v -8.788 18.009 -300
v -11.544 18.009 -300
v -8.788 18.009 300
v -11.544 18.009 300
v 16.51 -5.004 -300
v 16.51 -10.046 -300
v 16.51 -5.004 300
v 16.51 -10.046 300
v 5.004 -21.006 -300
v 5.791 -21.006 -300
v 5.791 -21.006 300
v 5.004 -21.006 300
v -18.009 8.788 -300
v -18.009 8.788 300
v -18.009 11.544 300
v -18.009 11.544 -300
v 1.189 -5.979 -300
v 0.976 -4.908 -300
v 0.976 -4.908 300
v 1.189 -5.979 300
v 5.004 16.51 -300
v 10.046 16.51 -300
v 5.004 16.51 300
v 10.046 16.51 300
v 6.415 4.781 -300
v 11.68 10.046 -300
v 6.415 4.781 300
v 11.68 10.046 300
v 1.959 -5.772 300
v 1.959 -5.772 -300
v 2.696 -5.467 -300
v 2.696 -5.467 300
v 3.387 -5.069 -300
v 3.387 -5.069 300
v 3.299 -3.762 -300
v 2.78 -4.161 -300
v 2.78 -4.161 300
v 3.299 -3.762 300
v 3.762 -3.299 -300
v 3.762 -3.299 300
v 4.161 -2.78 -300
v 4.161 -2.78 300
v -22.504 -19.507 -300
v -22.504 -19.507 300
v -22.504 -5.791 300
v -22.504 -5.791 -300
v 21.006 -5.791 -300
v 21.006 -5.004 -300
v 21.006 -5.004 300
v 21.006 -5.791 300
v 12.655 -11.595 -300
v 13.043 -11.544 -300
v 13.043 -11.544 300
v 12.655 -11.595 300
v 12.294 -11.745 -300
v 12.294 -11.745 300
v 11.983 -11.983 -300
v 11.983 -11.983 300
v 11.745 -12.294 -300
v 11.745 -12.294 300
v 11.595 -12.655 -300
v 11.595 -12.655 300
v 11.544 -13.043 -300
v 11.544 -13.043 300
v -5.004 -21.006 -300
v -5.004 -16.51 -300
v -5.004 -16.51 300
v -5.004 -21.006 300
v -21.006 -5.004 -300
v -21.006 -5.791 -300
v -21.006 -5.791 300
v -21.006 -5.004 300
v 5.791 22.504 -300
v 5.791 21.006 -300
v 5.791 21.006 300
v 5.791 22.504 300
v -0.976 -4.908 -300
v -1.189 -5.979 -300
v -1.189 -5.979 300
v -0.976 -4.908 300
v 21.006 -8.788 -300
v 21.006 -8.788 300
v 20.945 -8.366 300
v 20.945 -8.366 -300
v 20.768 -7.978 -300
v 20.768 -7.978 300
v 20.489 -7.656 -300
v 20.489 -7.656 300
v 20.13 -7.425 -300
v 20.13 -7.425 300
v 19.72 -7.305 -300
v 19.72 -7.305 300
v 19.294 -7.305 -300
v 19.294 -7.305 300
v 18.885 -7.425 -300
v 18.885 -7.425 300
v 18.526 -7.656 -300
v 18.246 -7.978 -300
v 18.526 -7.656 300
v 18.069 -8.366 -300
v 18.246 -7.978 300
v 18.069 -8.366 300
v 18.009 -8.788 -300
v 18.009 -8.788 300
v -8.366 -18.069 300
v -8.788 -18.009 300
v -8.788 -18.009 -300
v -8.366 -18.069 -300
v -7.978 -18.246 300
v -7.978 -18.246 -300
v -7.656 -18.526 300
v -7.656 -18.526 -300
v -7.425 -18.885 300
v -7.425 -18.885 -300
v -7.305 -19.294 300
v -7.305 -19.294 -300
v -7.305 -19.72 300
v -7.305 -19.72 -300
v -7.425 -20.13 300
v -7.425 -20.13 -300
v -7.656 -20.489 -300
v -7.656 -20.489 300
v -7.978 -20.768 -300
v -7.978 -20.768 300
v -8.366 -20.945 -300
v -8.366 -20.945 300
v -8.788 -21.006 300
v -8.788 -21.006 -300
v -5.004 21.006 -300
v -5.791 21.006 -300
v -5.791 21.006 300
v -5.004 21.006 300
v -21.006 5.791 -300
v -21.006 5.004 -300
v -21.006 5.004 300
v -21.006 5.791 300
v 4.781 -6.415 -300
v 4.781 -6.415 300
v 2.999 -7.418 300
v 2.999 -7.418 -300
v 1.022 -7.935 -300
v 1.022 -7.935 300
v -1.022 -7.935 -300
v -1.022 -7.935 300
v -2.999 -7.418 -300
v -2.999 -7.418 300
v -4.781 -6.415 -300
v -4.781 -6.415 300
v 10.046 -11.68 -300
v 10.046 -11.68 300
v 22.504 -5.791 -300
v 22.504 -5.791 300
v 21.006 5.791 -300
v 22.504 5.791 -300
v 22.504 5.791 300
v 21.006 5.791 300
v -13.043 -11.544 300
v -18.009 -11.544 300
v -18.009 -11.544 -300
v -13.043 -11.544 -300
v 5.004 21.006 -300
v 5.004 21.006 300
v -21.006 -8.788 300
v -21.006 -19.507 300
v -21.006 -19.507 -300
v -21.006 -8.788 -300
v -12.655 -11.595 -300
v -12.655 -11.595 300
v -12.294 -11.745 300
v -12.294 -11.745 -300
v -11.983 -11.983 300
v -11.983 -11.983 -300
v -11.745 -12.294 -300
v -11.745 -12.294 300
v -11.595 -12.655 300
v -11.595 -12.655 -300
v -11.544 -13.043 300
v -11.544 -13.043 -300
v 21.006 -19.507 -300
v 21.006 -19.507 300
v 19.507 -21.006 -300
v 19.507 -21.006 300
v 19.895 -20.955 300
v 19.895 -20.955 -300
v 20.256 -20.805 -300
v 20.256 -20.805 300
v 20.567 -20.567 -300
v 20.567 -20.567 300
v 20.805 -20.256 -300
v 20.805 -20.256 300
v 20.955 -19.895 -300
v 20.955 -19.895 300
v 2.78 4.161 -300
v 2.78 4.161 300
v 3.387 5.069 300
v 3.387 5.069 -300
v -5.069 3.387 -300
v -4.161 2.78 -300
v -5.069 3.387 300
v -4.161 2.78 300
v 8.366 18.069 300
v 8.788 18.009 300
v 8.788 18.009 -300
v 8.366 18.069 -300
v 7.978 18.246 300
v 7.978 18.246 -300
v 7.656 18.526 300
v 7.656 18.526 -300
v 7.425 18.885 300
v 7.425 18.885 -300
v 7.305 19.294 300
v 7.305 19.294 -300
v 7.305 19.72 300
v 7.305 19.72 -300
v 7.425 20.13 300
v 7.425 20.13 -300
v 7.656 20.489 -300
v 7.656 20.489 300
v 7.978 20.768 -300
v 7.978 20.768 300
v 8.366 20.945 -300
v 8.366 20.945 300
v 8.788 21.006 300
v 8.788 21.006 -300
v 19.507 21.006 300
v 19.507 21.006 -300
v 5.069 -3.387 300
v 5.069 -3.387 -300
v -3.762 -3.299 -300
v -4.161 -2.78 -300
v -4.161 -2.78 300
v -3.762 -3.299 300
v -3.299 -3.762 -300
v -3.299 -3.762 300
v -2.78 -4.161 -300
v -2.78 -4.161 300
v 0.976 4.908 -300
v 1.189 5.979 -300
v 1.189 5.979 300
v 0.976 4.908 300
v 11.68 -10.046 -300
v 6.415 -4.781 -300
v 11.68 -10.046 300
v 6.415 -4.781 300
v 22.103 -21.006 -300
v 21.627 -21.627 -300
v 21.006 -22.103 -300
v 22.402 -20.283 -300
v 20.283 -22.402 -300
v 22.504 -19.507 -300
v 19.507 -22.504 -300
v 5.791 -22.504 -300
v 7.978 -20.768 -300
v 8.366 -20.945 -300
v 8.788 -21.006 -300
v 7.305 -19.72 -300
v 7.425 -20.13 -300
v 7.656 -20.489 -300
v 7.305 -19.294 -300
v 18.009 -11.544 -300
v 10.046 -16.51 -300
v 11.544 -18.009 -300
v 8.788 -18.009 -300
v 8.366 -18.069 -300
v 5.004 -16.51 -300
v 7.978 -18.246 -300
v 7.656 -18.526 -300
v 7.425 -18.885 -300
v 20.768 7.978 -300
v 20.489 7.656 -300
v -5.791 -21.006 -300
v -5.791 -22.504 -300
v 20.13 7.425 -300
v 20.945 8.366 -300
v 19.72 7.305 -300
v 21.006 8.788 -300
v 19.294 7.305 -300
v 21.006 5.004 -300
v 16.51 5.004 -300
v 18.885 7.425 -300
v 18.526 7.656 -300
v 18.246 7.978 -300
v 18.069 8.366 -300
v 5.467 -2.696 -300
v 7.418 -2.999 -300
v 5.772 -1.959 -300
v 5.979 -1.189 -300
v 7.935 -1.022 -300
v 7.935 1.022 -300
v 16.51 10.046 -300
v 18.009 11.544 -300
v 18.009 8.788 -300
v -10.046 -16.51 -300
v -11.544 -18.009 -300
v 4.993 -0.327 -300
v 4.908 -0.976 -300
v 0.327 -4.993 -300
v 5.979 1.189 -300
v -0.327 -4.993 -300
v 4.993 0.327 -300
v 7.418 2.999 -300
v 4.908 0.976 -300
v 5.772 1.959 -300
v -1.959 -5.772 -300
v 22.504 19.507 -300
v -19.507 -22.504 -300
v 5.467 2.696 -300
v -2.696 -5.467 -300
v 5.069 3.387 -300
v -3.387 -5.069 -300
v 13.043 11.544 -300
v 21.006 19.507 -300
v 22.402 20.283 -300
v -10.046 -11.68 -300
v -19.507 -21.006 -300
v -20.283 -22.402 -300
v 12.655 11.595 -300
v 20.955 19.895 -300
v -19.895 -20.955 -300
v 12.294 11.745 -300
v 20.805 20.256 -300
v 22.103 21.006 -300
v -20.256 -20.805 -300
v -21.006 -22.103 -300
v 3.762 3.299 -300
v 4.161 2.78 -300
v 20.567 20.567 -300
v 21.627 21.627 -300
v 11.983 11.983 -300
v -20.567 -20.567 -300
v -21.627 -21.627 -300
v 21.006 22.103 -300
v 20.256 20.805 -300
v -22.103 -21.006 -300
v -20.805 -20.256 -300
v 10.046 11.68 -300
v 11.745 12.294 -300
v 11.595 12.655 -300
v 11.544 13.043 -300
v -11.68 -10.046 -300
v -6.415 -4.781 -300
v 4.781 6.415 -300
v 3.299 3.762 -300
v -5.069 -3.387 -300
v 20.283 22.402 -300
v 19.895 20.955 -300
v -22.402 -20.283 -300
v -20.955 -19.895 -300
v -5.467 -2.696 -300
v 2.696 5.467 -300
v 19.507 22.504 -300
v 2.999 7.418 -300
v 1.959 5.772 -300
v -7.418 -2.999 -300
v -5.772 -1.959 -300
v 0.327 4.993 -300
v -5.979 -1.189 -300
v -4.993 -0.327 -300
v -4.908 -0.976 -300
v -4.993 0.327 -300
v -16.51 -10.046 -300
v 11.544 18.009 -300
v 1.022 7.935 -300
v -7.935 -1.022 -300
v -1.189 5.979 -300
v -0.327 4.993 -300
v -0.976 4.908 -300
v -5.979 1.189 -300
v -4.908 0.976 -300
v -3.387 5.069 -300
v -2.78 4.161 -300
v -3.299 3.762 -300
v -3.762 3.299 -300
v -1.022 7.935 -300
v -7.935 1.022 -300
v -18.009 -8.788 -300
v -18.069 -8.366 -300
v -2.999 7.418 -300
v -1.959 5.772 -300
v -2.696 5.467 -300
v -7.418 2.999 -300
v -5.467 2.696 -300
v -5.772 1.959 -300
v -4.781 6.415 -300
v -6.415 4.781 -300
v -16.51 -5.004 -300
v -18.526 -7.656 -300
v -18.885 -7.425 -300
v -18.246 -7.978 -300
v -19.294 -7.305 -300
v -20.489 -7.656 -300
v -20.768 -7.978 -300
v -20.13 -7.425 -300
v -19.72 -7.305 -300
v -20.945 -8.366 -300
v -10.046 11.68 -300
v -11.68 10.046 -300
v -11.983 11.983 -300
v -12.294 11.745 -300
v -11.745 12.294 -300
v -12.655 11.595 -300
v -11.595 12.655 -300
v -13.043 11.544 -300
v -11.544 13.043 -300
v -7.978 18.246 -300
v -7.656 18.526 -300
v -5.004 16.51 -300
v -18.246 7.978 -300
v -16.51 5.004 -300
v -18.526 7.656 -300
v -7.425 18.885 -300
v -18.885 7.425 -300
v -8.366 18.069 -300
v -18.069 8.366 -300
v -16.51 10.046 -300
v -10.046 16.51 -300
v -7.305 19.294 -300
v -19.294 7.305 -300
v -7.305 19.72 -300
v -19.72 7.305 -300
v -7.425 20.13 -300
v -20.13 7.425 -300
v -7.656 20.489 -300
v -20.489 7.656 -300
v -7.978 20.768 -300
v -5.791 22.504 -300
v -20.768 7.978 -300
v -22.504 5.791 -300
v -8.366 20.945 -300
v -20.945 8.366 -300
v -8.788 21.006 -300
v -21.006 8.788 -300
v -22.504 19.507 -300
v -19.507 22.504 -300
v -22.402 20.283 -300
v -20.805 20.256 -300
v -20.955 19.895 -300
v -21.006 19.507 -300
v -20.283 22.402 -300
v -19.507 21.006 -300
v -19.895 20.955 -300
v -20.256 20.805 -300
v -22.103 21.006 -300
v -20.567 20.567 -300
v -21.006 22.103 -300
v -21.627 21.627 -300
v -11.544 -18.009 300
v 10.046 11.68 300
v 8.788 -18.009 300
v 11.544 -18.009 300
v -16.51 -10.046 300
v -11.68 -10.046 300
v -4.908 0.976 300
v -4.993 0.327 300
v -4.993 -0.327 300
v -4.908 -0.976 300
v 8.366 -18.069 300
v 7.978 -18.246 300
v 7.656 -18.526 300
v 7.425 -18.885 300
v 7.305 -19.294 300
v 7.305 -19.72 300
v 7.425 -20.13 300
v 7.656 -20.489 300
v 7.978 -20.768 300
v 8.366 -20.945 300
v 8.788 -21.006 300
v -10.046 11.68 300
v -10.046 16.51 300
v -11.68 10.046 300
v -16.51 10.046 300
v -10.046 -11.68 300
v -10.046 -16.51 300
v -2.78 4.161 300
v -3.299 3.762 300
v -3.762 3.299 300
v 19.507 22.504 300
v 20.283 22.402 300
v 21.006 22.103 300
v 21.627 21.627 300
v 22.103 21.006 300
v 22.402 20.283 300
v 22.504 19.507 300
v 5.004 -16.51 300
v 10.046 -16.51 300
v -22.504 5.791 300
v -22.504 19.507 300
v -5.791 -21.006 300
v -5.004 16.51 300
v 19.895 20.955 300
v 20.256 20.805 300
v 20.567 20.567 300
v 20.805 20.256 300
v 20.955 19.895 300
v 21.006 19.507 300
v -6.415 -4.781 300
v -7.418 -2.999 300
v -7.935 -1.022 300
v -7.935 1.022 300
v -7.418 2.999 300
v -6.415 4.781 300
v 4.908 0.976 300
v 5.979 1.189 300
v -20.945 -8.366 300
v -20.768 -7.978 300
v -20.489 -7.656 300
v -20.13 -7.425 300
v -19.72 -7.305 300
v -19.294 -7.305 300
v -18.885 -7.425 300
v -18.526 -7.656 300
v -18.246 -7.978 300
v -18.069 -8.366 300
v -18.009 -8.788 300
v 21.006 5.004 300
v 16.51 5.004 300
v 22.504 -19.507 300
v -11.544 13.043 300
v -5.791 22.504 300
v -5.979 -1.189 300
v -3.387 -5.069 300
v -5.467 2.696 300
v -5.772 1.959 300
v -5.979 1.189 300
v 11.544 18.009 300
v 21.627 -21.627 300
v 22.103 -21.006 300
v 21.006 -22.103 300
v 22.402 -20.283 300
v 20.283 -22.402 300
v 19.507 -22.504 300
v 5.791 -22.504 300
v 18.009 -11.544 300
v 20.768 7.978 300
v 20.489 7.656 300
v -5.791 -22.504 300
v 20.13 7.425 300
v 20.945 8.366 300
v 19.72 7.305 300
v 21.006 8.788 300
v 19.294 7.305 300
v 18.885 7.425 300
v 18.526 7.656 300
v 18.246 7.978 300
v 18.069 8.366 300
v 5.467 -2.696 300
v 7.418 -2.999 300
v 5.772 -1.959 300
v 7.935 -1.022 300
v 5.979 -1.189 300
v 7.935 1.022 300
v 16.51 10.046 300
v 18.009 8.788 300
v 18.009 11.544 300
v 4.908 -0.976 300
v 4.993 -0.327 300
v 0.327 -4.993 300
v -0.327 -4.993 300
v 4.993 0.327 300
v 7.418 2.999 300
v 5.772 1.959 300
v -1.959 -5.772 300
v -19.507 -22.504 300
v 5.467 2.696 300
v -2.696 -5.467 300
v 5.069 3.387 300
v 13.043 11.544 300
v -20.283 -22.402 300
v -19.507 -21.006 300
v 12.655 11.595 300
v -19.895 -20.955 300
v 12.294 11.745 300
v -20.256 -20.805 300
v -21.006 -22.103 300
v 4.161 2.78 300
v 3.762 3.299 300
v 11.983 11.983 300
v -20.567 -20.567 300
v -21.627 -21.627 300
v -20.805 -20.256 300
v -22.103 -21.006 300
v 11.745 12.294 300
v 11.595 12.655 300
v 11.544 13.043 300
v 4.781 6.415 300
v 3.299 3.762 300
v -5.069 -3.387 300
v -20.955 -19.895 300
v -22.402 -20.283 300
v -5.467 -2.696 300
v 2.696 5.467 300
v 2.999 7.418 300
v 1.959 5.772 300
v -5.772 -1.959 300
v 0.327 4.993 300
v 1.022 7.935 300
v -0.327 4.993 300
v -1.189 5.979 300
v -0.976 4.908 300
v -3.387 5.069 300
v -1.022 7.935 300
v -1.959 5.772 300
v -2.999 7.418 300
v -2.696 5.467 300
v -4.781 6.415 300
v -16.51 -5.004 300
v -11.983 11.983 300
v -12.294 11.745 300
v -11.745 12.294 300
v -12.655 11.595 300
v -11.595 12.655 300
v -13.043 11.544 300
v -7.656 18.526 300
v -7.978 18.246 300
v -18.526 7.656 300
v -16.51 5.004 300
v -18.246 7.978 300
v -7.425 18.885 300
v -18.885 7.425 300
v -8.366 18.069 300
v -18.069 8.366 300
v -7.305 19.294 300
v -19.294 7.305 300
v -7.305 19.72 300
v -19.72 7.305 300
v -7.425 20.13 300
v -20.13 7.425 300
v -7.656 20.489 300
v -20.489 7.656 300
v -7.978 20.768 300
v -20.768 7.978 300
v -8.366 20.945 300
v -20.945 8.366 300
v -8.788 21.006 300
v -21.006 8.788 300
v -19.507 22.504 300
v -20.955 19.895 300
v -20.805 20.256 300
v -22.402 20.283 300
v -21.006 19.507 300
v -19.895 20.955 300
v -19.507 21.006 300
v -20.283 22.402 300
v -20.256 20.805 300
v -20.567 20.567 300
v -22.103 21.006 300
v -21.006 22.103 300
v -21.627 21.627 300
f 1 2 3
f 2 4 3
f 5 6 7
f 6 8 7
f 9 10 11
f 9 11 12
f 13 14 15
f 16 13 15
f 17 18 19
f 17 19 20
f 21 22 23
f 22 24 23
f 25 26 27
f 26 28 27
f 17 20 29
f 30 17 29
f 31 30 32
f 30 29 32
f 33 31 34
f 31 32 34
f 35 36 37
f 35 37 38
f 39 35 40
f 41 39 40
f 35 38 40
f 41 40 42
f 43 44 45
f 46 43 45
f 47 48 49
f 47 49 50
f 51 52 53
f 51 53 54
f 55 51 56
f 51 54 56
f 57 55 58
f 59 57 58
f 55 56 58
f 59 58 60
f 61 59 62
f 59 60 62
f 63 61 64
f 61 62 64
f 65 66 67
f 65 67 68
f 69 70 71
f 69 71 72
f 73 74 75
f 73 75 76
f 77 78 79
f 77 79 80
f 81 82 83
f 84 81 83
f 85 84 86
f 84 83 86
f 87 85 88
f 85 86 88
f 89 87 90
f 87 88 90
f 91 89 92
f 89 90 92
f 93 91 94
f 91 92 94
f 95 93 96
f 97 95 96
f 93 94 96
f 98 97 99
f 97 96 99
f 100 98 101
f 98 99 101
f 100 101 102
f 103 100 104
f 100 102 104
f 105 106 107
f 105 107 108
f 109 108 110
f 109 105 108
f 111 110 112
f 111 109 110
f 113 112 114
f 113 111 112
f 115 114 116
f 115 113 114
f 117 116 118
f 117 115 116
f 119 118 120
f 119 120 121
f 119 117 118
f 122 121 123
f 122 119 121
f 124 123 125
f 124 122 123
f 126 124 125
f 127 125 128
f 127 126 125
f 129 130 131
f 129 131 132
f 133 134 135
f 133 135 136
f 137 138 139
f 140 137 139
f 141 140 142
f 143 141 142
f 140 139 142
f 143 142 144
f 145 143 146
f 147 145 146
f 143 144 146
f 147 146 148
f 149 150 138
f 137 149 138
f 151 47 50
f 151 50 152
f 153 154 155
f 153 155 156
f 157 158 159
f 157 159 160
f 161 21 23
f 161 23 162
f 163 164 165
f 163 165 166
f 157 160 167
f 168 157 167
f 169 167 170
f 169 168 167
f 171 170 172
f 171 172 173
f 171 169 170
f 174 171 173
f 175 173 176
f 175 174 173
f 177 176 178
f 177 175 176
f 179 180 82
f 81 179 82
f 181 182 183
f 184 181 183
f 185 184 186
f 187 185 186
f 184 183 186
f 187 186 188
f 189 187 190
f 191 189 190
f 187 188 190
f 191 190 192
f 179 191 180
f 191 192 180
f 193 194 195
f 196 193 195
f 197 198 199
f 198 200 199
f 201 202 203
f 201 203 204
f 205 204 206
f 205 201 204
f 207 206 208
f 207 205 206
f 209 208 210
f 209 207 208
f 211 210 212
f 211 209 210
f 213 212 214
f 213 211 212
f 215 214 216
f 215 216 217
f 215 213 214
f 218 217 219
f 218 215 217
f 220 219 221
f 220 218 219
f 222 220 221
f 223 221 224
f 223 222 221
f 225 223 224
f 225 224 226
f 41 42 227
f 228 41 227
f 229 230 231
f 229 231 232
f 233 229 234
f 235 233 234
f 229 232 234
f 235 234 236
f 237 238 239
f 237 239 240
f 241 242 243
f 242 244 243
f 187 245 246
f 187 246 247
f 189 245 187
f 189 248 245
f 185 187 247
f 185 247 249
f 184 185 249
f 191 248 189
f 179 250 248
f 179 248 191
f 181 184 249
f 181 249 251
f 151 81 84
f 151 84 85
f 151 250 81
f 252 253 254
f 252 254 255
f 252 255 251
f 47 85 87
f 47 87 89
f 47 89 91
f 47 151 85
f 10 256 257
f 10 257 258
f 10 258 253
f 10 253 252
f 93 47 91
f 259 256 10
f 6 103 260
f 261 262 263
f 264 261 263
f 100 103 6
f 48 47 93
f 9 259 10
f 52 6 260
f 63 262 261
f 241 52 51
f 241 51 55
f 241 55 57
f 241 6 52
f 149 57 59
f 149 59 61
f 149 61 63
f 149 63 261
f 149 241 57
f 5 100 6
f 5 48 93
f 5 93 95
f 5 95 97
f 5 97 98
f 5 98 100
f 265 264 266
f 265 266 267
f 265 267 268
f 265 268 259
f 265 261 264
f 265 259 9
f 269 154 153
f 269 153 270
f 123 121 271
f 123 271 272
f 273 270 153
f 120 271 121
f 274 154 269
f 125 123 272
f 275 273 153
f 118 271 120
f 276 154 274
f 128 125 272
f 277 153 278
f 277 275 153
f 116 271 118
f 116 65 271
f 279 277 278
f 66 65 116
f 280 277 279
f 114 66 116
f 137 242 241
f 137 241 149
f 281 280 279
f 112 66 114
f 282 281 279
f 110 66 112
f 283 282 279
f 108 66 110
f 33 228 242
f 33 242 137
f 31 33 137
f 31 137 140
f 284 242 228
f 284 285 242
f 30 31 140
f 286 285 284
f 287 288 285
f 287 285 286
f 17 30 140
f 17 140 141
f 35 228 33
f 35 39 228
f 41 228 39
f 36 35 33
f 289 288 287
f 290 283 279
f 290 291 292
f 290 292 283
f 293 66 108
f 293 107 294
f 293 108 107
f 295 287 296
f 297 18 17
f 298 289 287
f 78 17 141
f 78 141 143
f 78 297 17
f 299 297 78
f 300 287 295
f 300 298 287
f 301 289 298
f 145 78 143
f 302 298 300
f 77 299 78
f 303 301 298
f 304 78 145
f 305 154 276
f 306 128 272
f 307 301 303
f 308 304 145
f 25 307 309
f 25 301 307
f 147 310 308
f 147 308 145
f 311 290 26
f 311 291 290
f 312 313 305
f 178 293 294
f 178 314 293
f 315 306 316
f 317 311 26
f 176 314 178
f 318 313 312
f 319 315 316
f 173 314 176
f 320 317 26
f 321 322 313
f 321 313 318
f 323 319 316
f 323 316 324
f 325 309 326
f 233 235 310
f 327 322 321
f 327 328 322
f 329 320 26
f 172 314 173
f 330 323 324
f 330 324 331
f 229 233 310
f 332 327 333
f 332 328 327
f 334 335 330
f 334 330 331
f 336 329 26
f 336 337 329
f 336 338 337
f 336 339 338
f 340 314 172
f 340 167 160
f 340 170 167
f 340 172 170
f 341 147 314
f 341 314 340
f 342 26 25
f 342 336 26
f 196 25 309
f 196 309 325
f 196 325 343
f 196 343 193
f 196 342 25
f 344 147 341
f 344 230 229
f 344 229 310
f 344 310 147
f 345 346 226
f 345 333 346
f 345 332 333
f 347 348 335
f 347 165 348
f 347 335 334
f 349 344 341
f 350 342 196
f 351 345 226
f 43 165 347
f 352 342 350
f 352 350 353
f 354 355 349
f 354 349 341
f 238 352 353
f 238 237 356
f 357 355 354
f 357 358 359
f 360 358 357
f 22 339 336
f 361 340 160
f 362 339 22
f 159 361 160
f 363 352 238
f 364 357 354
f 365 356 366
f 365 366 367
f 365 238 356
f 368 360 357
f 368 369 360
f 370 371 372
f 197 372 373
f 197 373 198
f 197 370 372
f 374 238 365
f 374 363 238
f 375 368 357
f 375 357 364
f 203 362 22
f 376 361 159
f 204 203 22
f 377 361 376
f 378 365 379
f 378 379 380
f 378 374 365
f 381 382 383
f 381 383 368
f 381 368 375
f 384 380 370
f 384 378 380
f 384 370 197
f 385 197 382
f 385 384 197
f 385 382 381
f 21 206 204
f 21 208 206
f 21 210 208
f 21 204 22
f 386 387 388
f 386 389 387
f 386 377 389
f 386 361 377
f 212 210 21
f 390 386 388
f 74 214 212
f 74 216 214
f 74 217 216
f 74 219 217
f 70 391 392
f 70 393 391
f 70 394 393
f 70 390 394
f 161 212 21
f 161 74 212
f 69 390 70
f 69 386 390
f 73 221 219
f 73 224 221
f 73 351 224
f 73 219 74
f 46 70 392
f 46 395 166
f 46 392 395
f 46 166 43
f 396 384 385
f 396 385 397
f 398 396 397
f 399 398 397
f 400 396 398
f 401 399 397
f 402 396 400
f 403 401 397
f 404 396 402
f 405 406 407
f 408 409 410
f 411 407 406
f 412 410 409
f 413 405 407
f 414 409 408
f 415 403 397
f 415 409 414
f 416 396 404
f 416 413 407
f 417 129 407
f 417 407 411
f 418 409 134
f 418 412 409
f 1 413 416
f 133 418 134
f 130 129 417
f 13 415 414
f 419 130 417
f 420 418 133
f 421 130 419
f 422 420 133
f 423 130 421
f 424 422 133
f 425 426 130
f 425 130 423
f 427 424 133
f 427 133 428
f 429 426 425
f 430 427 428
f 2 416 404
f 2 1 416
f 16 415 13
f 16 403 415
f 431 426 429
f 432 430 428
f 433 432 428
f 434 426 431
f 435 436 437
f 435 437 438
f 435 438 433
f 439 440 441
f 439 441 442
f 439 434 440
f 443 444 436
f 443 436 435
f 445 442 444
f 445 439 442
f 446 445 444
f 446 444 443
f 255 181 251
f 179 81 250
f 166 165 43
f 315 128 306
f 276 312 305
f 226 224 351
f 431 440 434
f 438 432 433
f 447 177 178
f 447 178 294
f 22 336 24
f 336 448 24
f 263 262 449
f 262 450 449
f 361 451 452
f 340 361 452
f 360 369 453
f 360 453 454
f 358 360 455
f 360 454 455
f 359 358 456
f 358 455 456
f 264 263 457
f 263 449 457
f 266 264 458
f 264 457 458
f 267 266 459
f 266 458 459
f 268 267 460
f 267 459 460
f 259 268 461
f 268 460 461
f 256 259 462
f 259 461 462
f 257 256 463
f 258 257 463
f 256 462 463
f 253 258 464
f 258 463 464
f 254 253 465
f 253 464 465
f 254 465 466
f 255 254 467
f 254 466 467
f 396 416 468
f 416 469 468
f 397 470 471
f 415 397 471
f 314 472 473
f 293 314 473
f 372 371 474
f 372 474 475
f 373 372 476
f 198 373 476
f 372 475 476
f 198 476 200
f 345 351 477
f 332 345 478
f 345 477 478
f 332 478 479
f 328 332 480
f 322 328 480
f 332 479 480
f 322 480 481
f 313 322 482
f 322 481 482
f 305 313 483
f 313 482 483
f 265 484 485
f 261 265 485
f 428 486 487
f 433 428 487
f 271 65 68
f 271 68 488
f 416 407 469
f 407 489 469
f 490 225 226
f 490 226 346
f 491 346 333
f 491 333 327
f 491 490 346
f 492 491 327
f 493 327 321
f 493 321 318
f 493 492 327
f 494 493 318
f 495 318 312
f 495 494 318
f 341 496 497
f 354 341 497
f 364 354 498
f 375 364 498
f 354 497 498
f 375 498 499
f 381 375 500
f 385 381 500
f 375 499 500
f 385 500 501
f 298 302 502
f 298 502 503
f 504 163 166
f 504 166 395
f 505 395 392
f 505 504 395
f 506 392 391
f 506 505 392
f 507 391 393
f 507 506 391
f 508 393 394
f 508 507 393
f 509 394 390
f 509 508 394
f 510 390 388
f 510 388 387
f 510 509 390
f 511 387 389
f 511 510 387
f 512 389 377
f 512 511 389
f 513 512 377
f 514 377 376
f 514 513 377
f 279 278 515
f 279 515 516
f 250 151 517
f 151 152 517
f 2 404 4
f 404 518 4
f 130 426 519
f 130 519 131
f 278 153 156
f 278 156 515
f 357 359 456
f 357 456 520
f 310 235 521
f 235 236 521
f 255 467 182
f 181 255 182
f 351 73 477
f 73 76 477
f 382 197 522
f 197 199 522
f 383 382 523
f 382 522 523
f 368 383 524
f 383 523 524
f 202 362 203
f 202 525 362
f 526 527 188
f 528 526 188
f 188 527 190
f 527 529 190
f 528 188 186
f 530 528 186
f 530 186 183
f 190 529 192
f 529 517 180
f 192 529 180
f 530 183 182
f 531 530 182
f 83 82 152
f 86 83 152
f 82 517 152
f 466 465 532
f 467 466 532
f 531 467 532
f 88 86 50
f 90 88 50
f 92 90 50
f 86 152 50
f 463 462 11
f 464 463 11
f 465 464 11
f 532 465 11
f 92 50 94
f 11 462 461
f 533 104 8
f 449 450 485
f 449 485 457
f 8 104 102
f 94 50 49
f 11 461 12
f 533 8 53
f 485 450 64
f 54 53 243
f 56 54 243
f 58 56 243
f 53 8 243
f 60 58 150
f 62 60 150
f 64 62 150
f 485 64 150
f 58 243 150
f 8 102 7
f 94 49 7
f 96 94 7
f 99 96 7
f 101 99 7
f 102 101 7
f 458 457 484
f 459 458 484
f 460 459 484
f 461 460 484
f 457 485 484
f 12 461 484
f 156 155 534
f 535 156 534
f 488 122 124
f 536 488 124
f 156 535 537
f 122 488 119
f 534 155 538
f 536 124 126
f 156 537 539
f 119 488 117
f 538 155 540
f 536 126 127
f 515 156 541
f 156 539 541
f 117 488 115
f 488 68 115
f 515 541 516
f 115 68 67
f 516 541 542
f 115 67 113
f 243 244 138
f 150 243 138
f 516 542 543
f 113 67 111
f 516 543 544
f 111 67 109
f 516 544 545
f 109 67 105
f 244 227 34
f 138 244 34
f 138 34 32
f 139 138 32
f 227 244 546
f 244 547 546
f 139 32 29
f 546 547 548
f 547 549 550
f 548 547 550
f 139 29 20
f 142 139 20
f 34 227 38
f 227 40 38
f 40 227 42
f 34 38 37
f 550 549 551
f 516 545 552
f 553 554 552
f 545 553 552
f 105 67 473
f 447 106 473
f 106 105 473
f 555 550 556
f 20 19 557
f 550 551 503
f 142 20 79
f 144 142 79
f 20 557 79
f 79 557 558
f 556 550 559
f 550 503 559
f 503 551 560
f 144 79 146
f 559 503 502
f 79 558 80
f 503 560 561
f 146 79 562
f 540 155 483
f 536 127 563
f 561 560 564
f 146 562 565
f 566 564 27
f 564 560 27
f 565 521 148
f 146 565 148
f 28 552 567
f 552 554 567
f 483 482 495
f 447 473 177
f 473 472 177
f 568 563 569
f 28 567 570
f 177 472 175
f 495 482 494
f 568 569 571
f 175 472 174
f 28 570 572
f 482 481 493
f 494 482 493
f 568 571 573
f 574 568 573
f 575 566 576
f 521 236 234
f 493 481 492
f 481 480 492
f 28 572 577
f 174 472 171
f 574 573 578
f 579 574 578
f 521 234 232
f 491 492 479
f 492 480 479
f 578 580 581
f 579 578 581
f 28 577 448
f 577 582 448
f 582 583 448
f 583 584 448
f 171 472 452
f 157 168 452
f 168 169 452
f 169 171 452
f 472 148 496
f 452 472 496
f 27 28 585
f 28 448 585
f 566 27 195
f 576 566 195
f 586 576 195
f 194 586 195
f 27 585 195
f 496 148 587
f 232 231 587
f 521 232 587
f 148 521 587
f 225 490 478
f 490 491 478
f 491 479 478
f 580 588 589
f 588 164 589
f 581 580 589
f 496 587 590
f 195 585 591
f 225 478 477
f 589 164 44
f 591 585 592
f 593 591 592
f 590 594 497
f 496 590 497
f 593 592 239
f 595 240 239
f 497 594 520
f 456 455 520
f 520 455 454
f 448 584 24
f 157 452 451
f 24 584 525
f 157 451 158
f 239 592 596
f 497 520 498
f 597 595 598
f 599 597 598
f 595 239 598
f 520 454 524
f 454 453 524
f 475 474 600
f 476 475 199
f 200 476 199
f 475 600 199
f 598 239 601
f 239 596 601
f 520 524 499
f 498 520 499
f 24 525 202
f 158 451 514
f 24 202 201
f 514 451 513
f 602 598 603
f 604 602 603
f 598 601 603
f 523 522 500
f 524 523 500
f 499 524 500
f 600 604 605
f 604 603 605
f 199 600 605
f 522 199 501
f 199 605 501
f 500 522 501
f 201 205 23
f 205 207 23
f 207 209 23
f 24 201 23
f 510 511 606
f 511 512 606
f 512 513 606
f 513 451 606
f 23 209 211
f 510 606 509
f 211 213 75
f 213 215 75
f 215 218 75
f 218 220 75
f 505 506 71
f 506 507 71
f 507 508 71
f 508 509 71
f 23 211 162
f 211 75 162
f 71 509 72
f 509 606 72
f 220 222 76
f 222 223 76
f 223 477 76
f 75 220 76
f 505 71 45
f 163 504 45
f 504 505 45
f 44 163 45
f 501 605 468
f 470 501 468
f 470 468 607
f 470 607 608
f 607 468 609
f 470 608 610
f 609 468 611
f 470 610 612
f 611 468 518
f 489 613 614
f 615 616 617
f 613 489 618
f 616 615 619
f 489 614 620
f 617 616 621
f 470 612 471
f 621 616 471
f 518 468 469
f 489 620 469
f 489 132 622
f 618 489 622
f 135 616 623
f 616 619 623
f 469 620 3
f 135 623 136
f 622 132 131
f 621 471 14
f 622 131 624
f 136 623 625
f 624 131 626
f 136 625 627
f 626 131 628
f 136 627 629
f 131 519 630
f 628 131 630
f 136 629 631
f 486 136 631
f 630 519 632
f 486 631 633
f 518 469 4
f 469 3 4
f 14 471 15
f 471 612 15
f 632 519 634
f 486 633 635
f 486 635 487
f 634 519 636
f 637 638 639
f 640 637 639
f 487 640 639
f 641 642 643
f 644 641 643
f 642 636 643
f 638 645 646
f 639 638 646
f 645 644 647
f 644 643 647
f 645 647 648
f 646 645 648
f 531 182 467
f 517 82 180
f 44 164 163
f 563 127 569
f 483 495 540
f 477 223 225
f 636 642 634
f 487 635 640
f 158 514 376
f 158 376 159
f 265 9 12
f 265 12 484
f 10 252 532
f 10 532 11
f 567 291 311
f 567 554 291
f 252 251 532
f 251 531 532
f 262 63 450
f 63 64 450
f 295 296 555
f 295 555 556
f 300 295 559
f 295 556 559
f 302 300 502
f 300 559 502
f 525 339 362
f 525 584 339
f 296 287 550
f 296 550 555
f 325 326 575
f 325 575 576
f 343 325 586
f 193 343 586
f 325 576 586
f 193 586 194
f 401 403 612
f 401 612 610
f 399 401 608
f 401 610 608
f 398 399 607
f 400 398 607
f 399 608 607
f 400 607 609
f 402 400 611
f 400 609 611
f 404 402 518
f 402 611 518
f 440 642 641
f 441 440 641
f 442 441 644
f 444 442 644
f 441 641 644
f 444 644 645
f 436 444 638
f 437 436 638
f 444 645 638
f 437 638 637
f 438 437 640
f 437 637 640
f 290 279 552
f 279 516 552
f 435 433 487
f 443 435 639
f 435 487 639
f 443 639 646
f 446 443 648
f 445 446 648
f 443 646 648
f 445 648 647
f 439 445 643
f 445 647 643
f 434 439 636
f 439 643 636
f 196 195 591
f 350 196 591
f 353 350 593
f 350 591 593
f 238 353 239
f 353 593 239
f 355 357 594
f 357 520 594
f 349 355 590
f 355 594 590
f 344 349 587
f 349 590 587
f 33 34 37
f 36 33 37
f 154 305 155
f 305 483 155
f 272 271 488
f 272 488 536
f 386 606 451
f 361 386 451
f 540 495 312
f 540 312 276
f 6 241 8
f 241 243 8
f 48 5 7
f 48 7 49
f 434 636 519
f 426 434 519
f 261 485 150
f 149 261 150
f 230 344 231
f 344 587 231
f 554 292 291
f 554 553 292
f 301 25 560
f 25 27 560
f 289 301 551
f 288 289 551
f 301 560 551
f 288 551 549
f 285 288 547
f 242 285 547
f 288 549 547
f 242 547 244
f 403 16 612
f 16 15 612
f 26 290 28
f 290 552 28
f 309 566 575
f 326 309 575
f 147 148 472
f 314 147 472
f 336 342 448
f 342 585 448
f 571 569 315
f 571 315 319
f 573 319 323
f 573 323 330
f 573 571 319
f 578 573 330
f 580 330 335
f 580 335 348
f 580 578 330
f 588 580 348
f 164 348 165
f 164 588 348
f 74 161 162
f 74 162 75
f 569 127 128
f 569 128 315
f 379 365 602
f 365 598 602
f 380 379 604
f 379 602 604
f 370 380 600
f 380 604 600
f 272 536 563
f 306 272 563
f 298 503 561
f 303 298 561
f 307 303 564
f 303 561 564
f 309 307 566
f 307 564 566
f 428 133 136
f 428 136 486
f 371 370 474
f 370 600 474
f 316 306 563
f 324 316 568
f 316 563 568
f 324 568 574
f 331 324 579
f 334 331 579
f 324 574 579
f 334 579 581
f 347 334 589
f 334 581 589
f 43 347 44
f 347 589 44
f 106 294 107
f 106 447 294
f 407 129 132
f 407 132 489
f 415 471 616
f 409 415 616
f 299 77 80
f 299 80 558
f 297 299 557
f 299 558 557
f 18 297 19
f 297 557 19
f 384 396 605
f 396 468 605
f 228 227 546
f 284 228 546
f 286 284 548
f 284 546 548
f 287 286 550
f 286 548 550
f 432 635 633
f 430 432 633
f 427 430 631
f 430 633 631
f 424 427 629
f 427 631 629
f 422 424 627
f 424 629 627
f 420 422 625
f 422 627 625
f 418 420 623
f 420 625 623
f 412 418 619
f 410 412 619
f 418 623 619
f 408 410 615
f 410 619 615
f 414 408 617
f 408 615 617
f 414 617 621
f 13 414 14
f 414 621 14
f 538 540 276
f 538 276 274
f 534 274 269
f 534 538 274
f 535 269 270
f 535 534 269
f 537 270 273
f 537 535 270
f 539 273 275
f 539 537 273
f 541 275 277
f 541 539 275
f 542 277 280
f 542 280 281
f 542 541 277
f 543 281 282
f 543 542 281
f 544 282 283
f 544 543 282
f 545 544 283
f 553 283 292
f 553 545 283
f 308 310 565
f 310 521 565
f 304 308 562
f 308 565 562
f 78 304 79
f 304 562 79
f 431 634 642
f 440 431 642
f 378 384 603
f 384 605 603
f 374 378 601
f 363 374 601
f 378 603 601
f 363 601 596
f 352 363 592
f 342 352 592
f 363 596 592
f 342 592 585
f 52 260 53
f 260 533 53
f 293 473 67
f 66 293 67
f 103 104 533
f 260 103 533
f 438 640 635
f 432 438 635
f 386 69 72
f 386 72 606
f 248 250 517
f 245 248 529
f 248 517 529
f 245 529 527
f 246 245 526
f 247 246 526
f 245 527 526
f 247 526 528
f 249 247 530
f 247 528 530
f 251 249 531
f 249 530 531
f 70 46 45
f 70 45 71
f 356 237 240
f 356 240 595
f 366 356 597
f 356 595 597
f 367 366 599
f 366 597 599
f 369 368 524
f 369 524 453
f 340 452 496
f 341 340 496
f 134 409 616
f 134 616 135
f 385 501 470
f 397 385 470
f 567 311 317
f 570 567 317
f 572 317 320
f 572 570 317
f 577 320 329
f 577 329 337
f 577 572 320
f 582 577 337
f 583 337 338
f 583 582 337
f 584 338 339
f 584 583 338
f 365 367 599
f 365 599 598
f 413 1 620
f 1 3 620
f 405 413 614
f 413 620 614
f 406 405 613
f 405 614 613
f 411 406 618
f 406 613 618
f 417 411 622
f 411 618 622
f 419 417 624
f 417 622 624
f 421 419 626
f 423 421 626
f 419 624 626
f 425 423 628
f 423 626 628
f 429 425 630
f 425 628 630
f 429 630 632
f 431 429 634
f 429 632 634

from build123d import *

# Parameters (mm, degrees)
BOSS_EXTRUDE1_DEPTH = 300


with BuildPart() as part:
    # Sketch1 → Boss-Extrude1 (new, symmetric)
    with BuildSketch(Plane.XY):
        with BuildLine():
            Line((-19.5072, 22.5044), (-5.7912, 22.5044))
            Line((-5.7912, 22.5044), (-5.7912, 21.0058))
            Line((-5.7912, 21.0058), (-5.0038, 21.0058))
            Line((-5.0038, 21.0058), (-5.0038, 16.51))
            Line((-5.0038, 16.51), (-10.0457, 16.51))
            Line((-10.0457, 16.51), (-10.0457, 11.680106614))
            Line((-10.0457, 11.680106614), (-4.781026704, 6.415433318))
            ThreePointArc((-4.781026704, 6.415433318), (0, 8.001), (4.781026704, 6.415433318))
            Line((4.781026704, 6.415433318), (10.0457, 11.680106614))
            Line((10.0457, 11.680106614), (10.0457, 16.51))
            Line((10.0457, 16.51), (5.0038, 16.51))
            Line((5.0038, 16.51), (5.0038, 21.0058))
            Line((5.0038, 21.0058), (5.7912, 21.0058))
            Line((5.7912, 21.0058), (5.7912, 22.5044))
            Line((5.7912, 22.5044), (19.5072, 22.5044))
            ThreePointArc((19.5072, 22.5044), (21.626540445, 21.626540445), (22.5044, 19.5072))
            Line((22.5044, 19.5072), (22.5044, 5.7912))
            Line((22.5044, 5.7912), (21.0058, 5.7912))
            Line((21.0058, 5.7912), (21.0058, 5.0038))
            Line((21.0058, 5.0038), (16.51, 5.0038))
            Line((16.51, 5.0038), (16.51, 10.0457))
            Line((16.51, 10.0457), (11.680106614, 10.0457))
            Line((11.680106614, 10.0457), (6.415433318, 4.781026704))
            ThreePointArc((6.415433318, 4.781026704), (8.001, 0), (6.415433318, -4.781026704))
            Line((6.415433318, -4.781026704), (11.680106614, -10.0457))
            Line((11.680106614, -10.0457), (16.51, -10.0457))
            Line((16.51, -10.0457), (16.51, -5.0038))
            Line((16.51, -5.0038), (21.0058, -5.0038))
            Line((21.0058, -5.0038), (21.0058, -5.7912))
            Line((21.0058, -5.7912), (22.5044, -5.7912))
            Line((22.5044, -5.7912), (22.5044, -19.5072))
            ThreePointArc((22.5044, -19.5072), (21.626540445, -21.626540445), (19.5072, -22.5044))
            Line((19.5072, -22.5044), (5.7912, -22.5044))
            Line((5.7912, -22.5044), (5.7912, -21.0058))
            Line((5.7912, -21.0058), (5.0038, -21.0058))
            Line((5.0038, -21.0058), (5.0038, -16.51))
            Line((5.0038, -16.51), (10.0457, -16.51))
            Line((10.0457, -16.51), (10.0457, -11.680106614))
            Line((10.0457, -11.680106614), (4.781026704, -6.415433318))
            ThreePointArc((4.781026704, -6.415433318), (0, -8.001), (-4.781026704, -6.415433318))
            Line((-4.781026704, -6.415433318), (-10.0457, -11.680106614))
            Line((-10.0457, -11.680106614), (-10.0457, -16.51))
            Line((-10.0457, -16.51), (-5.0038, -16.51))
            Line((-5.0038, -16.51), (-5.0038, -21.0058))
            Line((-5.0038, -21.0058), (-5.7912, -21.0058))
            Line((-5.7912, -21.0058), (-5.7912, -22.5044))
            Line((-5.7912, -22.5044), (-19.5072, -22.5044))
            ThreePointArc((-19.5072, -22.5044), (-21.626540445, -21.626540445), (-22.5044, -19.5072))
            Line((-22.5044, -19.5072), (-22.5044, -5.7912))
            Line((-22.5044, -5.7912), (-21.0058, -5.7912))
            Line((-21.0058, -5.7912), (-21.0058, -5.0038))
            Line((-21.0058, -5.0038), (-16.51, -5.0038))
            Line((-16.51, -5.0038), (-16.51, -10.0457))
            Line((-16.51, -10.0457), (-11.680106614, -10.0457))
            Line((-11.680106614, -10.0457), (-6.415433318, -4.781026704))
            ThreePointArc((-6.415433318, -4.781026704), (-8.001, 0), (-6.415433318, 4.781026704))
            Line((-6.415433318, 4.781026704), (-11.680106614, 10.0457))
            Line((-11.680106614, 10.0457), (-16.51, 10.0457))
            Line((-16.51, 10.0457), (-16.51, 5.0038))
            Line((-16.51, 5.0038), (-21.0058, 5.0038))
            Line((-21.0058, 5.0038), (-21.0058, 5.7912))
            Line((-21.0058, 5.7912), (-22.5044, 5.7912))
            Line((-22.5044, 5.7912), (-22.5044, 19.5072))
            ThreePointArc((-22.5044, 19.5072), (-21.626540445, 21.626540445), (-19.5072, 22.5044))
        make_face()
        with BuildLine():
            Line((-18.0086, 11.5443), (-13.0429, 11.5443))
            ThreePointArc((-13.0429, 11.5443), (-11.983229778, 11.983229778), (-11.5443, 13.0429))
            Line((-11.5443, 13.0429), (-11.5443, 18.0086))
            Line((-11.5443, 18.0086), (-8.7884, 18.0086))
            ThreePointArc((-8.7884, 18.0086), (-7.2898, 19.5072), (-8.7884, 21.0058))
            Line((-8.7884, 21.0058), (-19.5072, 21.0058))
            ThreePointArc((-19.5072, 21.0058), (-20.566870222, 20.566870222), (-21.0058, 19.5072))
            Line((-21.0058, 19.5072), (-21.0058, 8.7884))
            ThreePointArc((-21.0058, 8.7884), (-19.5072, 7.2898), (-18.0086, 8.7884))
            Line((-18.0086, 8.7884), (-18.0086, 11.5443))
        make_face(mode=Mode.SUBTRACT)
        with BuildLine():
            Line((1.189270603, 5.978867069), (0.976192953, 4.907653386))
            ThreePointArc((0.976192953, 4.907653386), (0, 5.0038), (-0.976192953, 4.907653386))
            Line((-0.976192953, 4.907653386), (-1.189270603, 5.978867069))
            ThreePointArc((-1.189270603, 5.978867069), (-2.332838204, 5.63196963), (-3.38675614, 5.068638757))
            Line((-3.38675614, 5.068638757), (-2.779962332, 4.160507646))
            ThreePointArc((-2.779962332, 4.160507646), (-3.538220912, 3.538220912), (-4.160507646, 2.779962332))
            Line((-4.160507646, 2.779962332), (-5.068638757, 3.38675614))
            ThreePointArc((-5.068638757, 3.38675614), (-5.63196963, 2.332838204), (-5.978867069, 1.189270603))
            Line((-5.978867069, 1.189270603), (-4.907653386, 0.976192953))
            ThreePointArc((-4.907653386, 0.976192953), (-5.0038, 0), (-4.907653386, -0.976192953))
            Line((-4.907653386, -0.976192953), (-5.978867069, -1.189270603))
            ThreePointArc((-5.978867069, -1.189270603), (-5.63196963, -2.332838204), (-5.068638757, -3.38675614))
            Line((-5.068638757, -3.38675614), (-4.160507646, -2.779962332))
            ThreePointArc((-4.160507646, -2.779962332), (-3.538220912, -3.538220912), (-2.779962332, -4.160507646))
            Line((-2.779962332, -4.160507646), (-3.38675614, -5.068638757))
            ThreePointArc((-3.38675614, -5.068638757), (-2.332838204, -5.63196963), (-1.189270603, -5.978867069))
            Line((-1.189270603, -5.978867069), (-0.976192953, -4.907653386))
            ThreePointArc((-0.976192953, -4.907653386), (0, -5.0038), (0.976192953, -4.907653386))
            Line((0.976192953, -4.907653386), (1.189270603, -5.978867069))
            ThreePointArc((1.189270603, -5.978867069), (2.332838204, -5.63196963), (3.38675614, -5.068638757))
            Line((3.38675614, -5.068638757), (2.779962332, -4.160507646))
            ThreePointArc((2.779962332, -4.160507646), (3.538220912, -3.538220912), (4.160507646, -2.779962332))
            Line((4.160507646, -2.779962332), (5.068638757, -3.38675614))
            ThreePointArc((5.068638757, -3.38675614), (5.63196963, -2.332838204), (5.978867069, -1.189270603))
            Line((5.978867069, -1.189270603), (4.907653386, -0.976192953))
            ThreePointArc((4.907653386, -0.976192953), (5.0038, 0), (4.907653386, 0.976192953))
            Line((4.907653386, 0.976192953), (5.978867069, 1.189270603))
            ThreePointArc((5.978867069, 1.189270603), (5.63196963, 2.332838204), (5.068638757, 3.38675614))
            Line((5.068638757, 3.38675614), (4.160507646, 2.779962332))
            ThreePointArc((4.160507646, 2.779962332), (3.538220912, 3.538220912), (2.779962332, 4.160507646))
            Line((2.779962332, 4.160507646), (3.38675614, 5.068638757))
            ThreePointArc((3.38675614, 5.068638757), (2.332838204, 5.63196963), (1.189270603, 5.978867069))
        make_face(mode=Mode.SUBTRACT)
        with BuildLine():
            Line((11.5443, 18.0086), (8.7884, 18.0086))
            ThreePointArc((8.7884, 18.0086), (7.2898, 19.5072), (8.7884, 21.0058))
            Line((8.7884, 21.0058), (19.5072, 21.0058))
            ThreePointArc((19.5072, 21.0058), (20.566870222, 20.566870222), (21.0058, 19.5072))
            Line((21.0058, 19.5072), (21.0058, 8.7884))
            ThreePointArc((21.0058, 8.7884), (19.5072, 7.2898), (18.0086, 8.7884))
            Line((18.0086, 8.7884), (18.0086, 11.5443))
            Line((18.0086, 11.5443), (13.0429, 11.5443))
            ThreePointArc((13.0429, 11.5443), (11.983229778, 11.983229778), (11.5443, 13.0429))
            Line((11.5443, 13.0429), (11.5443, 18.0086))
        make_face(mode=Mode.SUBTRACT)
        with BuildLine():
            Line((18.0086, -11.5443), (13.0429, -11.5443))
            ThreePointArc((13.0429, -11.5443), (11.983229778, -11.983229778), (11.5443, -13.0429))
            Line((11.5443, -13.0429), (11.5443, -18.0086))
            Line((11.5443, -18.0086), (8.7884, -18.0086))
            ThreePointArc((8.7884, -18.0086), (7.2898, -19.5072), (8.7884, -21.0058))
            Line((8.7884, -21.0058), (19.5072, -21.0058))
            ThreePointArc((19.5072, -21.0058), (20.566870222, -20.566870222), (21.0058, -19.5072))
            Line((21.0058, -19.5072), (21.0058, -8.7884))
            ThreePointArc((21.0058, -8.7884), (19.5072, -7.2898), (18.0086, -8.7884))
            Line((18.0086, -8.7884), (18.0086, -11.5443))
        make_face(mode=Mode.SUBTRACT)
        with BuildLine():
            Line((-11.5443, -18.0086), (-8.7884, -18.0086))
            ThreePointArc((-8.7884, -18.0086), (-7.2898, -19.5072), (-8.7884, -21.0058))
            Line((-8.7884, -21.0058), (-19.5072, -21.0058))
            ThreePointArc((-19.5072, -21.0058), (-20.566870222, -20.566870222), (-21.0058, -19.5072))
            Line((-21.0058, -19.5072), (-21.0058, -8.7884))
            ThreePointArc((-21.0058, -8.7884), (-19.5072, -7.2898), (-18.0086, -8.7884))
            Line((-18.0086, -8.7884), (-18.0086, -11.5443))
            Line((-18.0086, -11.5443), (-13.0429, -11.5443))
            ThreePointArc((-13.0429, -11.5443), (-11.983229778, -11.983229778), (-11.5443, -13.0429))
            Line((-11.5443, -13.0429), (-11.5443, -18.0086))
        make_face(mode=Mode.SUBTRACT)
    extrude(amount=BOSS_EXTRUDE1_DEPTH, both=True)


solid = part.part
